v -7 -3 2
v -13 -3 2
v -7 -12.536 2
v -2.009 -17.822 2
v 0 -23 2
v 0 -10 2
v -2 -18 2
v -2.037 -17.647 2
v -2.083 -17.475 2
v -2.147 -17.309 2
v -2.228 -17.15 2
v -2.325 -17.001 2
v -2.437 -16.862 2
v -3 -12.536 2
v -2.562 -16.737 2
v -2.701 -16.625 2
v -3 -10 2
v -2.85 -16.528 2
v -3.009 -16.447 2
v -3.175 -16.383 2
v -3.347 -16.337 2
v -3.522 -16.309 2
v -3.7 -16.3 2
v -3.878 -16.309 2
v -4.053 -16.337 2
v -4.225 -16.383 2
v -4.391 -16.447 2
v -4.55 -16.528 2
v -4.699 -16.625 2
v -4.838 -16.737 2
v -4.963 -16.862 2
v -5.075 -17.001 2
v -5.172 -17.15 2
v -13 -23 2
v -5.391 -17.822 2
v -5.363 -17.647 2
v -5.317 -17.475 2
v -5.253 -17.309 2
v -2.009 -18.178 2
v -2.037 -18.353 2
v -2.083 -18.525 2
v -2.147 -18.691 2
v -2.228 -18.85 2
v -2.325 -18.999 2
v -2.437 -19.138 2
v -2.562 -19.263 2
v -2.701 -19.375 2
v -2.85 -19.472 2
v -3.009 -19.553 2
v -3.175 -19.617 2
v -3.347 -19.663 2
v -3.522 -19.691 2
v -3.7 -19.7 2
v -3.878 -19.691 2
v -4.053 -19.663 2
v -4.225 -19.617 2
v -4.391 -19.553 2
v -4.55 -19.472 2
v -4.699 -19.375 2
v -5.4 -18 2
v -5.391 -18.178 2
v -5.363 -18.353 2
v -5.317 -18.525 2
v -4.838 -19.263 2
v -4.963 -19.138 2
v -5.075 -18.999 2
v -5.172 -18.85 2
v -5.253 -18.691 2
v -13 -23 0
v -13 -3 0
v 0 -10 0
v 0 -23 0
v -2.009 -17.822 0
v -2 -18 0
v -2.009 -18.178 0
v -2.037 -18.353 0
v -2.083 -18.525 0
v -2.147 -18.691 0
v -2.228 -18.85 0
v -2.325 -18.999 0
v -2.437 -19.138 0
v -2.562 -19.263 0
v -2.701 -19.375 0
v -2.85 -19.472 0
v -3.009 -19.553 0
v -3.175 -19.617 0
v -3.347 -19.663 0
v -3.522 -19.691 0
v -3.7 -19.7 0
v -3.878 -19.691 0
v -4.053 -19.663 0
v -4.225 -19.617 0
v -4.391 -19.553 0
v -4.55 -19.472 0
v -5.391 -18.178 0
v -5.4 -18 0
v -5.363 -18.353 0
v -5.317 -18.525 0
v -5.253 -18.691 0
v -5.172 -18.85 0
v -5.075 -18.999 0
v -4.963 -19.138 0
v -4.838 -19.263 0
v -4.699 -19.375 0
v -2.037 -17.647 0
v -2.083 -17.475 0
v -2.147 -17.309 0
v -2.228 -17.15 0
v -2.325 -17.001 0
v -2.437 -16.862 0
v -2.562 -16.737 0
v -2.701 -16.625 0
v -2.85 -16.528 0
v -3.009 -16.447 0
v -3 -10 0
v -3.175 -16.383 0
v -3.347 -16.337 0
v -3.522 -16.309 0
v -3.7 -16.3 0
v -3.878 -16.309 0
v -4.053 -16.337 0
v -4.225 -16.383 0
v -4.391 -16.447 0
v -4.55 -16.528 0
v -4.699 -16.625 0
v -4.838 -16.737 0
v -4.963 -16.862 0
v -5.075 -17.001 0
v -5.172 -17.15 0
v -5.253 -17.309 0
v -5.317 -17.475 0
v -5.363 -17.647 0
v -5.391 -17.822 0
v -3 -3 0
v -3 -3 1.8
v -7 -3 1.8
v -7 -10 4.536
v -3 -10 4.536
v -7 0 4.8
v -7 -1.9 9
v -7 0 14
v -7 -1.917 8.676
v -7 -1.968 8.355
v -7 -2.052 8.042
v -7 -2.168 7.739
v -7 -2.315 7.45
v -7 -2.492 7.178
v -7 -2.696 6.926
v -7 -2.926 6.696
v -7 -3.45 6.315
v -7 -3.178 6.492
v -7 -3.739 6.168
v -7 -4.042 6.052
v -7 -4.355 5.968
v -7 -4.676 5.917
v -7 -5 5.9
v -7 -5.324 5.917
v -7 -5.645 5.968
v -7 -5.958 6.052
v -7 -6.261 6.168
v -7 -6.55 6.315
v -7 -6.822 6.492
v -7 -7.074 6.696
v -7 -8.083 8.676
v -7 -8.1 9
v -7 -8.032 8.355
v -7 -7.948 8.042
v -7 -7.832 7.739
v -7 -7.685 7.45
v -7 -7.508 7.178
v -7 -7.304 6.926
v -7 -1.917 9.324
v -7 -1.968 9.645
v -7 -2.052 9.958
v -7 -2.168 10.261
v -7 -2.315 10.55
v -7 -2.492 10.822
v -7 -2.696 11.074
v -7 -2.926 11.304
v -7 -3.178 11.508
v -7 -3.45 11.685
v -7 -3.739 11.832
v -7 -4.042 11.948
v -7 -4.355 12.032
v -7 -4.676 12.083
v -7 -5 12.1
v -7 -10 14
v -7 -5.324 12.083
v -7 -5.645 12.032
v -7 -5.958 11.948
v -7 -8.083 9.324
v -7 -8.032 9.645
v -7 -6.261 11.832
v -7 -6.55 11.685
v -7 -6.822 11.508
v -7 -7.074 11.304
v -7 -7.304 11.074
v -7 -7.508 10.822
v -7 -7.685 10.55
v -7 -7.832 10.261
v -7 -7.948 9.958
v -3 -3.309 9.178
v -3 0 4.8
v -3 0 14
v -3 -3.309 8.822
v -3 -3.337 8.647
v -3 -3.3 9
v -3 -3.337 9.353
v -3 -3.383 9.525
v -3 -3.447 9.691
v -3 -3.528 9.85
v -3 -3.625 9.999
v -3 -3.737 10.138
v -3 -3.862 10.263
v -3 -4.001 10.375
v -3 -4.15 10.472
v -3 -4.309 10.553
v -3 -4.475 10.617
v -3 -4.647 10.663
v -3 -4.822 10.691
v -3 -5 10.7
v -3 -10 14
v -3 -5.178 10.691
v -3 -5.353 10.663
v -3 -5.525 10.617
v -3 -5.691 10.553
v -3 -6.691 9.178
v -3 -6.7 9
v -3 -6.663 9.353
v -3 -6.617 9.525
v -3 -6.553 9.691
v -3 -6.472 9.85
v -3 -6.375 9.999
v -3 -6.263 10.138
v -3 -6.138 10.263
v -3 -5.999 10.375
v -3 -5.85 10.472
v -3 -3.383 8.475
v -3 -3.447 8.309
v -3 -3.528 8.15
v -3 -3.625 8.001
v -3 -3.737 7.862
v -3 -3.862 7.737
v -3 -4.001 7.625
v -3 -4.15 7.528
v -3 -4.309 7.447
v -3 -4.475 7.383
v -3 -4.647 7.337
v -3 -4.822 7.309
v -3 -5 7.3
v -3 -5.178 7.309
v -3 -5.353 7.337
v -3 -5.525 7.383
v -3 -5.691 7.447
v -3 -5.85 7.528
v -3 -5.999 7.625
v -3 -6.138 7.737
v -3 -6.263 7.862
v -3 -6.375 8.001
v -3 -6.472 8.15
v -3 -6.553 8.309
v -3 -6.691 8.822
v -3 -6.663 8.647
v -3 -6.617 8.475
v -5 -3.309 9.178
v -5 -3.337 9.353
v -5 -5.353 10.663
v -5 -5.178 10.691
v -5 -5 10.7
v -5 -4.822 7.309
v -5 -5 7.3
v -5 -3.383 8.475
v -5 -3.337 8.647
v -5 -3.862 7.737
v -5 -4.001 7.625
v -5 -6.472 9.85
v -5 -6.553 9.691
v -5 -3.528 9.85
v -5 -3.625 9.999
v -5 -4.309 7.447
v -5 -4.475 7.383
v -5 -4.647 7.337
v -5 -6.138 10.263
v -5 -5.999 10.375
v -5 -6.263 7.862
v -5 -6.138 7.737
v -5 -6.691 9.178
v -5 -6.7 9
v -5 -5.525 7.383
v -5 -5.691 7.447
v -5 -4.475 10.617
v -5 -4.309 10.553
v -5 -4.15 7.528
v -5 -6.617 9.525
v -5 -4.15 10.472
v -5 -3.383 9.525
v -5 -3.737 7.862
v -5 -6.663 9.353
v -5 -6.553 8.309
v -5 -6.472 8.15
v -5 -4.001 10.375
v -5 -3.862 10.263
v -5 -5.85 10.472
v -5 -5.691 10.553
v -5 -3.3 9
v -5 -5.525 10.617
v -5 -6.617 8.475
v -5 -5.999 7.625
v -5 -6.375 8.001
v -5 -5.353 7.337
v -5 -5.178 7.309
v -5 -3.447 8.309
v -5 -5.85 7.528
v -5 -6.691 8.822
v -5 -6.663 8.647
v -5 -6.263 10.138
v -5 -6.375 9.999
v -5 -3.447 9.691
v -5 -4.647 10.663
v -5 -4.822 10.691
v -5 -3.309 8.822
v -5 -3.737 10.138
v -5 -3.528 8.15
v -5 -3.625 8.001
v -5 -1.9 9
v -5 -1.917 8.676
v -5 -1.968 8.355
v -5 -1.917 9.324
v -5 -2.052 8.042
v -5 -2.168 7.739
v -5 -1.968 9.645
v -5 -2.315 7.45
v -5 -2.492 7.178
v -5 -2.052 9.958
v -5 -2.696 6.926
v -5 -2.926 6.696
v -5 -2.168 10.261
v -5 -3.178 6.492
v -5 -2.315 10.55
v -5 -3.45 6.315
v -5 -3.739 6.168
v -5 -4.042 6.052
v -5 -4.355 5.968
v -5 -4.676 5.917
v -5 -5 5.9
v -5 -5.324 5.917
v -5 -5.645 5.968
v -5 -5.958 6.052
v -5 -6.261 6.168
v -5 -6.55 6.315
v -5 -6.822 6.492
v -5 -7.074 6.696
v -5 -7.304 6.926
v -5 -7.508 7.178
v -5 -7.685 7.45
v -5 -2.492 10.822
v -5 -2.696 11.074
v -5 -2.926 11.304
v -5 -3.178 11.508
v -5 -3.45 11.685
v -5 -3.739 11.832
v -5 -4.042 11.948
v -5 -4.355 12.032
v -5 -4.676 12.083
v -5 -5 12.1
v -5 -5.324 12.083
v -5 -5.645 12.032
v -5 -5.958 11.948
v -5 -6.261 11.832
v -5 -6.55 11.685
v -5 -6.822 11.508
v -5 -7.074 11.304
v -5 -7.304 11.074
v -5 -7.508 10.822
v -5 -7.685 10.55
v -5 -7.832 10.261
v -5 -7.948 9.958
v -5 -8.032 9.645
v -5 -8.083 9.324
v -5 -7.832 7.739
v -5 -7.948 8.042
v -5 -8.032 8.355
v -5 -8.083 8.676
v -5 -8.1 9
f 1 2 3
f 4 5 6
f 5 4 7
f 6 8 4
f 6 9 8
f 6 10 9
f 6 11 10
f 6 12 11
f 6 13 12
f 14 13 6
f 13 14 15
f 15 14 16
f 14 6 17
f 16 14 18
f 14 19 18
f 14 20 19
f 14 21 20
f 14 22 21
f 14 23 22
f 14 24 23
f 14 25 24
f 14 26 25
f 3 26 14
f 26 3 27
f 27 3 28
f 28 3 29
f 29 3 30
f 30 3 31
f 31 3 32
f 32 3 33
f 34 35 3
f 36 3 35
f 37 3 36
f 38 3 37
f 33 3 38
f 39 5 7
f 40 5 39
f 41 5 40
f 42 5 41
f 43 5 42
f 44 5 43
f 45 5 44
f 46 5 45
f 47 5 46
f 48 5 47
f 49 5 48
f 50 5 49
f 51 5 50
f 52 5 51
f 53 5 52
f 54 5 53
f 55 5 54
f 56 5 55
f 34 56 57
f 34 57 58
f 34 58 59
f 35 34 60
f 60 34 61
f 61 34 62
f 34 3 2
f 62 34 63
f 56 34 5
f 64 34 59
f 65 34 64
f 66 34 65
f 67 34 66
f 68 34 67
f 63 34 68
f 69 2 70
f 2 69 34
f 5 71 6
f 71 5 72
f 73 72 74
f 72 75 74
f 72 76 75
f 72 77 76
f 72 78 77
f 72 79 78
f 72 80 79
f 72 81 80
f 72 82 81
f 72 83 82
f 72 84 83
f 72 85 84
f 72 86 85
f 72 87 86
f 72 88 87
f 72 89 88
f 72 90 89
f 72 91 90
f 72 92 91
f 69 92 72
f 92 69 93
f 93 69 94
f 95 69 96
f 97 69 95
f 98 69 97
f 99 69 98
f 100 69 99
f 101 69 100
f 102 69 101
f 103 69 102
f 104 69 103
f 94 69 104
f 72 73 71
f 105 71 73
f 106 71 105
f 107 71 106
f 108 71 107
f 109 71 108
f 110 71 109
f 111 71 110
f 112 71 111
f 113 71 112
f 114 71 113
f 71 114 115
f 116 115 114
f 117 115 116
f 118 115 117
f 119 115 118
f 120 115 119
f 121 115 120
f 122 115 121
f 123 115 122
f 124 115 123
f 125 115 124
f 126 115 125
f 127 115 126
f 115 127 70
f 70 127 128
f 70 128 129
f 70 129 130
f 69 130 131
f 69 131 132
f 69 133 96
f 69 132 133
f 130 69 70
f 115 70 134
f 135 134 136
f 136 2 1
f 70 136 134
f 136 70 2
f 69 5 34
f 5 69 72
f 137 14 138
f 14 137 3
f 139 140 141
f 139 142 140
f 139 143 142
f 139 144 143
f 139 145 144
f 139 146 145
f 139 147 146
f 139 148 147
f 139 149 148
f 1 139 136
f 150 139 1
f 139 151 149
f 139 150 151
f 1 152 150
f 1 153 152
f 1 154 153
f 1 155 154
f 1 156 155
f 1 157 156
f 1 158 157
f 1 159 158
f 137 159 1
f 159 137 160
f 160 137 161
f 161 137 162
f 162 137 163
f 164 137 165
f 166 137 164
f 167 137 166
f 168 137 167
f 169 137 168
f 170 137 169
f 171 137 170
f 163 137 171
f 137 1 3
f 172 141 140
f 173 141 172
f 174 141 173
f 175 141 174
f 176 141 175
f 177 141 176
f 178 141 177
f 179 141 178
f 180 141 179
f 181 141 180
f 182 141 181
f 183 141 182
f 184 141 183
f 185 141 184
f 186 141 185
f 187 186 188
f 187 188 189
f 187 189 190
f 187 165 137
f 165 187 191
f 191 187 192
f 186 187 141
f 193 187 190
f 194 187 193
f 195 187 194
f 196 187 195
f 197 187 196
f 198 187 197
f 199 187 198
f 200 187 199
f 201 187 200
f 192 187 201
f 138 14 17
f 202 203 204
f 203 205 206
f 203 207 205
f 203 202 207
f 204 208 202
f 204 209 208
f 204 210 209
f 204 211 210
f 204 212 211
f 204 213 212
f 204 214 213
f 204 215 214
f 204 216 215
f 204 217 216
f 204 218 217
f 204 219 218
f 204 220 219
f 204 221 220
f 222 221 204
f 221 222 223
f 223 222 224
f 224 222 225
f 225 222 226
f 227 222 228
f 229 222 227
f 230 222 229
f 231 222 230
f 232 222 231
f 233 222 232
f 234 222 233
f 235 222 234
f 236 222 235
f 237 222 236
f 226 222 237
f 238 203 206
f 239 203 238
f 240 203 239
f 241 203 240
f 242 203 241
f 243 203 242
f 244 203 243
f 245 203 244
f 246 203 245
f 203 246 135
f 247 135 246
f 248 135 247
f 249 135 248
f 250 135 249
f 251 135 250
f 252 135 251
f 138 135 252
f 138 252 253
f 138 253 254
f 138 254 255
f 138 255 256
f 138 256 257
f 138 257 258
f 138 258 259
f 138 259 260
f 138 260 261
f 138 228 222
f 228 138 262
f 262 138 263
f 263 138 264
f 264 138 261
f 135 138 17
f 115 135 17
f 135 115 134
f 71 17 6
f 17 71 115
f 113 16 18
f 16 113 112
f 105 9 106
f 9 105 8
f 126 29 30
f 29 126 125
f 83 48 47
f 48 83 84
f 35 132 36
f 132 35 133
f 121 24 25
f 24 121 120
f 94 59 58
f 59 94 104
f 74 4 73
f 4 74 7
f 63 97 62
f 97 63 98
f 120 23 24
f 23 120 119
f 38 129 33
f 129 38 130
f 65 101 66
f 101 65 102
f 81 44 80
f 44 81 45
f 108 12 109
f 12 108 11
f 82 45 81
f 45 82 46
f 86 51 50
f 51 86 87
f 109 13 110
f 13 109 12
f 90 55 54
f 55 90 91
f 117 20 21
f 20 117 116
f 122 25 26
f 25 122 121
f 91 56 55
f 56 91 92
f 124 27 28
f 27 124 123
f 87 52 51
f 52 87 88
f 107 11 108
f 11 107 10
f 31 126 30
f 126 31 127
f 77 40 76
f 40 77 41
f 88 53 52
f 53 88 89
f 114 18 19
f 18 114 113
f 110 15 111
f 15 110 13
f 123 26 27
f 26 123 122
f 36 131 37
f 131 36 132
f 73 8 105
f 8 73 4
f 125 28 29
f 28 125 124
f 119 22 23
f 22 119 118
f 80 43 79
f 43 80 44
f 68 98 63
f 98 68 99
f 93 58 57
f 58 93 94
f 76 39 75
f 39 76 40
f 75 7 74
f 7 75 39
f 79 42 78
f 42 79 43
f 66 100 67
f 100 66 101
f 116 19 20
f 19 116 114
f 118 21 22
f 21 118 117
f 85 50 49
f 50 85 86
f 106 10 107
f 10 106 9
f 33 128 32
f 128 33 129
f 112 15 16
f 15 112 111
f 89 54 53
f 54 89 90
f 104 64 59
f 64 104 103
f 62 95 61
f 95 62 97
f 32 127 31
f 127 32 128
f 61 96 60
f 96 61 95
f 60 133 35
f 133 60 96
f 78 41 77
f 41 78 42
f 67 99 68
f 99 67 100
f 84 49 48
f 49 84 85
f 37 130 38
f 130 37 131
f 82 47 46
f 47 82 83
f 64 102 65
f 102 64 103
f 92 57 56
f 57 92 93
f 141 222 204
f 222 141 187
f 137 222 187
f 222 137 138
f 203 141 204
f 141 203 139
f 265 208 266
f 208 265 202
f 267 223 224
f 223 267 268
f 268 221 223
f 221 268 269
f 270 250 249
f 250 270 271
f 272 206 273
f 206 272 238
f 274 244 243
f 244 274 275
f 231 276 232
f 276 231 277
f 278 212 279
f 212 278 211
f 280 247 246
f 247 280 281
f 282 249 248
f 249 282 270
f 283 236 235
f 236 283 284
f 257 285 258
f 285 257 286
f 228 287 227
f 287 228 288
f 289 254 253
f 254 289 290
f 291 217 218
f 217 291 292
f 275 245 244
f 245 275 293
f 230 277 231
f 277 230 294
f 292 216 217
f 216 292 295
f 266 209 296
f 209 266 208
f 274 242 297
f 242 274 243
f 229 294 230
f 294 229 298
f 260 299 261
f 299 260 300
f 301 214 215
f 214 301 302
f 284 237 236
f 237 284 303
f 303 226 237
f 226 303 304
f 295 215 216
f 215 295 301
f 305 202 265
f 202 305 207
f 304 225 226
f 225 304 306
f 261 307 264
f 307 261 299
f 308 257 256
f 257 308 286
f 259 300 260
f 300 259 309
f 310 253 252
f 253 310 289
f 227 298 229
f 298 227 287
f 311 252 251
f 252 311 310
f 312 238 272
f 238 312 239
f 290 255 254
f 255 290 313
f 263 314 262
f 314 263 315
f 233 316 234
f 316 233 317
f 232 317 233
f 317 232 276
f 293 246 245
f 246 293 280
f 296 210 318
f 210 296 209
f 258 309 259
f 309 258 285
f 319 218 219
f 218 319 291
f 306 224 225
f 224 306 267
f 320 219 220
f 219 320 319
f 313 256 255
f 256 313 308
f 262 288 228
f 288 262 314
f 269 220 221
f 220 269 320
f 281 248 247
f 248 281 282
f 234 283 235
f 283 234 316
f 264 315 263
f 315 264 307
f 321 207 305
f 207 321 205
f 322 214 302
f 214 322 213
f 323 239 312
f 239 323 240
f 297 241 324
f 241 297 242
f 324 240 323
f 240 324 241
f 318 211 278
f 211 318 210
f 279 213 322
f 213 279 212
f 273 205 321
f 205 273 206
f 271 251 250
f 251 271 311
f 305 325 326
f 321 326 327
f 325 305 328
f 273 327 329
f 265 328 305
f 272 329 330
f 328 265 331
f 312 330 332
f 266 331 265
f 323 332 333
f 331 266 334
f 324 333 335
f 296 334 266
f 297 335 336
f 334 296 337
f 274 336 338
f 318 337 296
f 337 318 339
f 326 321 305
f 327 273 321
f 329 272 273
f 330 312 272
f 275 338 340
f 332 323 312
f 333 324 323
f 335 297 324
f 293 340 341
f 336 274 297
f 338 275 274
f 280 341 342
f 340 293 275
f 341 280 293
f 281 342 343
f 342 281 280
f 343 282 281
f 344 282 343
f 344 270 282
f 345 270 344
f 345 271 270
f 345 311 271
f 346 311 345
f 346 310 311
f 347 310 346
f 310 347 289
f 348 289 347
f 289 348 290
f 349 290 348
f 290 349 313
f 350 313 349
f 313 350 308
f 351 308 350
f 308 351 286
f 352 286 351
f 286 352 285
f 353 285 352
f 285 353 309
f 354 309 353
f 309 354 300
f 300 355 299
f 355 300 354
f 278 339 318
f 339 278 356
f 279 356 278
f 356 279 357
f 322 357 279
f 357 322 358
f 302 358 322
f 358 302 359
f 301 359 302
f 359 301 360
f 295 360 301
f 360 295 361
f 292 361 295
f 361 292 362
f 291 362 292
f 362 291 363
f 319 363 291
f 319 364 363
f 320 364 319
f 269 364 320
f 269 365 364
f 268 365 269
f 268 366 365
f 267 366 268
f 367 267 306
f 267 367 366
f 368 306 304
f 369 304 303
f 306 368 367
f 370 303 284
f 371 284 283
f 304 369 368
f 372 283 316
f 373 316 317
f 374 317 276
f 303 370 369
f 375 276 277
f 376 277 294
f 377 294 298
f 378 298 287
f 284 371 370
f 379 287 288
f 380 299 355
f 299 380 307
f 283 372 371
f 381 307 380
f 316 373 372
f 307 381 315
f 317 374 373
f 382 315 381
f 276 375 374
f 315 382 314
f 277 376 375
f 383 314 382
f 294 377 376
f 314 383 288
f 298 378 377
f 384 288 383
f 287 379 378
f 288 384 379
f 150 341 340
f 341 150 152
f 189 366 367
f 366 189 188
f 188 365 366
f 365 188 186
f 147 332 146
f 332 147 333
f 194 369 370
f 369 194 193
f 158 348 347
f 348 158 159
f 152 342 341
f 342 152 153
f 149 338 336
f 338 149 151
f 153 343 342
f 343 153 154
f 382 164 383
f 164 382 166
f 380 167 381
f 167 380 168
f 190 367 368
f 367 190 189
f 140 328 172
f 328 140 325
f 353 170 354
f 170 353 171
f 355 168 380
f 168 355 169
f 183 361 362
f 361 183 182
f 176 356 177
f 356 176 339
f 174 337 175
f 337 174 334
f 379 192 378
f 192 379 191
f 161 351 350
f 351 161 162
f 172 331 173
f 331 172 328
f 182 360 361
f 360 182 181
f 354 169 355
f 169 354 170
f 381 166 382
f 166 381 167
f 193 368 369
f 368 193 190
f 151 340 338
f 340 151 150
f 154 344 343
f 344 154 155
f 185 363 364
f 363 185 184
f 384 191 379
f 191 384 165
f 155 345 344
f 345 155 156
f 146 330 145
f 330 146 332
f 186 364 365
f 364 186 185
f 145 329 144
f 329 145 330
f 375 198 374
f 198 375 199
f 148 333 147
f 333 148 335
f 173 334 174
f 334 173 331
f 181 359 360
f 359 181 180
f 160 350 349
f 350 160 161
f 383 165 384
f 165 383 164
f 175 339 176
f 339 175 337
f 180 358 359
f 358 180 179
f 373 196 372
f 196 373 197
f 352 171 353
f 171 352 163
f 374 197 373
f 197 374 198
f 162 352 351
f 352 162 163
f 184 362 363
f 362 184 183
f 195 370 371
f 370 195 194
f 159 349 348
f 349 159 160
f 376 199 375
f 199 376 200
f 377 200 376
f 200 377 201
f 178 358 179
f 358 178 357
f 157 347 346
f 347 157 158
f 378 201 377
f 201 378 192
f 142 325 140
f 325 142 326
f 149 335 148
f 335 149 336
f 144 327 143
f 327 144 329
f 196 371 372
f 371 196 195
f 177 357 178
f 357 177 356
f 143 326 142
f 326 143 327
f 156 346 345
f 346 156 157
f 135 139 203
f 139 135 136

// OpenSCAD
// Real Lonely T-Rex Game: Loop Motor Mounter
// Copyright (C) 2017, Uri Shaked and Ariella Eliassaf

$fn=60;

side = 0; // 0 for left, 1 for right

motor_hole_height = 9;
loop_hole_inset = 3.7;

mirror([0,side,0])
union() {
    rotate([0,-90,0])
    difference() {
        union() {
            translate([0,-23,0])
            cube([2,20,13]);
            
            translate([0,-11,3])
            rotate([90,0,45])
            cube([5,4,2.5]);
        }

        translate([-0.5,-10,-0.5])
        cube([3,9,3.5]);

        translate([-0.5,-18,loop_hole_inset])
        rotate([0,90,0])
        cylinder(h=6,r=1.7);
    }
       
    rotate([90,-90,0]) {
        difference() {
            translate([4.8,3,0])
            cube([motor_hole_height+0.2,4,10]);

            translate([motor_hole_height,5,5])
            rotate([90,0,0])
            cylinder(r=1.7,h=2);

            translate([motor_hole_height,8,5])
            rotate([90,0,0])
            cylinder(r=3.1,h=3);
        }

        translate([13-8.2-5*sin(45),3,5*cos(45)])
        rotate([0,45,0])
        cube([5,4,2.5]);
        
        translate([0,3,3])
        cube([5,4,7]);       
    }
}
